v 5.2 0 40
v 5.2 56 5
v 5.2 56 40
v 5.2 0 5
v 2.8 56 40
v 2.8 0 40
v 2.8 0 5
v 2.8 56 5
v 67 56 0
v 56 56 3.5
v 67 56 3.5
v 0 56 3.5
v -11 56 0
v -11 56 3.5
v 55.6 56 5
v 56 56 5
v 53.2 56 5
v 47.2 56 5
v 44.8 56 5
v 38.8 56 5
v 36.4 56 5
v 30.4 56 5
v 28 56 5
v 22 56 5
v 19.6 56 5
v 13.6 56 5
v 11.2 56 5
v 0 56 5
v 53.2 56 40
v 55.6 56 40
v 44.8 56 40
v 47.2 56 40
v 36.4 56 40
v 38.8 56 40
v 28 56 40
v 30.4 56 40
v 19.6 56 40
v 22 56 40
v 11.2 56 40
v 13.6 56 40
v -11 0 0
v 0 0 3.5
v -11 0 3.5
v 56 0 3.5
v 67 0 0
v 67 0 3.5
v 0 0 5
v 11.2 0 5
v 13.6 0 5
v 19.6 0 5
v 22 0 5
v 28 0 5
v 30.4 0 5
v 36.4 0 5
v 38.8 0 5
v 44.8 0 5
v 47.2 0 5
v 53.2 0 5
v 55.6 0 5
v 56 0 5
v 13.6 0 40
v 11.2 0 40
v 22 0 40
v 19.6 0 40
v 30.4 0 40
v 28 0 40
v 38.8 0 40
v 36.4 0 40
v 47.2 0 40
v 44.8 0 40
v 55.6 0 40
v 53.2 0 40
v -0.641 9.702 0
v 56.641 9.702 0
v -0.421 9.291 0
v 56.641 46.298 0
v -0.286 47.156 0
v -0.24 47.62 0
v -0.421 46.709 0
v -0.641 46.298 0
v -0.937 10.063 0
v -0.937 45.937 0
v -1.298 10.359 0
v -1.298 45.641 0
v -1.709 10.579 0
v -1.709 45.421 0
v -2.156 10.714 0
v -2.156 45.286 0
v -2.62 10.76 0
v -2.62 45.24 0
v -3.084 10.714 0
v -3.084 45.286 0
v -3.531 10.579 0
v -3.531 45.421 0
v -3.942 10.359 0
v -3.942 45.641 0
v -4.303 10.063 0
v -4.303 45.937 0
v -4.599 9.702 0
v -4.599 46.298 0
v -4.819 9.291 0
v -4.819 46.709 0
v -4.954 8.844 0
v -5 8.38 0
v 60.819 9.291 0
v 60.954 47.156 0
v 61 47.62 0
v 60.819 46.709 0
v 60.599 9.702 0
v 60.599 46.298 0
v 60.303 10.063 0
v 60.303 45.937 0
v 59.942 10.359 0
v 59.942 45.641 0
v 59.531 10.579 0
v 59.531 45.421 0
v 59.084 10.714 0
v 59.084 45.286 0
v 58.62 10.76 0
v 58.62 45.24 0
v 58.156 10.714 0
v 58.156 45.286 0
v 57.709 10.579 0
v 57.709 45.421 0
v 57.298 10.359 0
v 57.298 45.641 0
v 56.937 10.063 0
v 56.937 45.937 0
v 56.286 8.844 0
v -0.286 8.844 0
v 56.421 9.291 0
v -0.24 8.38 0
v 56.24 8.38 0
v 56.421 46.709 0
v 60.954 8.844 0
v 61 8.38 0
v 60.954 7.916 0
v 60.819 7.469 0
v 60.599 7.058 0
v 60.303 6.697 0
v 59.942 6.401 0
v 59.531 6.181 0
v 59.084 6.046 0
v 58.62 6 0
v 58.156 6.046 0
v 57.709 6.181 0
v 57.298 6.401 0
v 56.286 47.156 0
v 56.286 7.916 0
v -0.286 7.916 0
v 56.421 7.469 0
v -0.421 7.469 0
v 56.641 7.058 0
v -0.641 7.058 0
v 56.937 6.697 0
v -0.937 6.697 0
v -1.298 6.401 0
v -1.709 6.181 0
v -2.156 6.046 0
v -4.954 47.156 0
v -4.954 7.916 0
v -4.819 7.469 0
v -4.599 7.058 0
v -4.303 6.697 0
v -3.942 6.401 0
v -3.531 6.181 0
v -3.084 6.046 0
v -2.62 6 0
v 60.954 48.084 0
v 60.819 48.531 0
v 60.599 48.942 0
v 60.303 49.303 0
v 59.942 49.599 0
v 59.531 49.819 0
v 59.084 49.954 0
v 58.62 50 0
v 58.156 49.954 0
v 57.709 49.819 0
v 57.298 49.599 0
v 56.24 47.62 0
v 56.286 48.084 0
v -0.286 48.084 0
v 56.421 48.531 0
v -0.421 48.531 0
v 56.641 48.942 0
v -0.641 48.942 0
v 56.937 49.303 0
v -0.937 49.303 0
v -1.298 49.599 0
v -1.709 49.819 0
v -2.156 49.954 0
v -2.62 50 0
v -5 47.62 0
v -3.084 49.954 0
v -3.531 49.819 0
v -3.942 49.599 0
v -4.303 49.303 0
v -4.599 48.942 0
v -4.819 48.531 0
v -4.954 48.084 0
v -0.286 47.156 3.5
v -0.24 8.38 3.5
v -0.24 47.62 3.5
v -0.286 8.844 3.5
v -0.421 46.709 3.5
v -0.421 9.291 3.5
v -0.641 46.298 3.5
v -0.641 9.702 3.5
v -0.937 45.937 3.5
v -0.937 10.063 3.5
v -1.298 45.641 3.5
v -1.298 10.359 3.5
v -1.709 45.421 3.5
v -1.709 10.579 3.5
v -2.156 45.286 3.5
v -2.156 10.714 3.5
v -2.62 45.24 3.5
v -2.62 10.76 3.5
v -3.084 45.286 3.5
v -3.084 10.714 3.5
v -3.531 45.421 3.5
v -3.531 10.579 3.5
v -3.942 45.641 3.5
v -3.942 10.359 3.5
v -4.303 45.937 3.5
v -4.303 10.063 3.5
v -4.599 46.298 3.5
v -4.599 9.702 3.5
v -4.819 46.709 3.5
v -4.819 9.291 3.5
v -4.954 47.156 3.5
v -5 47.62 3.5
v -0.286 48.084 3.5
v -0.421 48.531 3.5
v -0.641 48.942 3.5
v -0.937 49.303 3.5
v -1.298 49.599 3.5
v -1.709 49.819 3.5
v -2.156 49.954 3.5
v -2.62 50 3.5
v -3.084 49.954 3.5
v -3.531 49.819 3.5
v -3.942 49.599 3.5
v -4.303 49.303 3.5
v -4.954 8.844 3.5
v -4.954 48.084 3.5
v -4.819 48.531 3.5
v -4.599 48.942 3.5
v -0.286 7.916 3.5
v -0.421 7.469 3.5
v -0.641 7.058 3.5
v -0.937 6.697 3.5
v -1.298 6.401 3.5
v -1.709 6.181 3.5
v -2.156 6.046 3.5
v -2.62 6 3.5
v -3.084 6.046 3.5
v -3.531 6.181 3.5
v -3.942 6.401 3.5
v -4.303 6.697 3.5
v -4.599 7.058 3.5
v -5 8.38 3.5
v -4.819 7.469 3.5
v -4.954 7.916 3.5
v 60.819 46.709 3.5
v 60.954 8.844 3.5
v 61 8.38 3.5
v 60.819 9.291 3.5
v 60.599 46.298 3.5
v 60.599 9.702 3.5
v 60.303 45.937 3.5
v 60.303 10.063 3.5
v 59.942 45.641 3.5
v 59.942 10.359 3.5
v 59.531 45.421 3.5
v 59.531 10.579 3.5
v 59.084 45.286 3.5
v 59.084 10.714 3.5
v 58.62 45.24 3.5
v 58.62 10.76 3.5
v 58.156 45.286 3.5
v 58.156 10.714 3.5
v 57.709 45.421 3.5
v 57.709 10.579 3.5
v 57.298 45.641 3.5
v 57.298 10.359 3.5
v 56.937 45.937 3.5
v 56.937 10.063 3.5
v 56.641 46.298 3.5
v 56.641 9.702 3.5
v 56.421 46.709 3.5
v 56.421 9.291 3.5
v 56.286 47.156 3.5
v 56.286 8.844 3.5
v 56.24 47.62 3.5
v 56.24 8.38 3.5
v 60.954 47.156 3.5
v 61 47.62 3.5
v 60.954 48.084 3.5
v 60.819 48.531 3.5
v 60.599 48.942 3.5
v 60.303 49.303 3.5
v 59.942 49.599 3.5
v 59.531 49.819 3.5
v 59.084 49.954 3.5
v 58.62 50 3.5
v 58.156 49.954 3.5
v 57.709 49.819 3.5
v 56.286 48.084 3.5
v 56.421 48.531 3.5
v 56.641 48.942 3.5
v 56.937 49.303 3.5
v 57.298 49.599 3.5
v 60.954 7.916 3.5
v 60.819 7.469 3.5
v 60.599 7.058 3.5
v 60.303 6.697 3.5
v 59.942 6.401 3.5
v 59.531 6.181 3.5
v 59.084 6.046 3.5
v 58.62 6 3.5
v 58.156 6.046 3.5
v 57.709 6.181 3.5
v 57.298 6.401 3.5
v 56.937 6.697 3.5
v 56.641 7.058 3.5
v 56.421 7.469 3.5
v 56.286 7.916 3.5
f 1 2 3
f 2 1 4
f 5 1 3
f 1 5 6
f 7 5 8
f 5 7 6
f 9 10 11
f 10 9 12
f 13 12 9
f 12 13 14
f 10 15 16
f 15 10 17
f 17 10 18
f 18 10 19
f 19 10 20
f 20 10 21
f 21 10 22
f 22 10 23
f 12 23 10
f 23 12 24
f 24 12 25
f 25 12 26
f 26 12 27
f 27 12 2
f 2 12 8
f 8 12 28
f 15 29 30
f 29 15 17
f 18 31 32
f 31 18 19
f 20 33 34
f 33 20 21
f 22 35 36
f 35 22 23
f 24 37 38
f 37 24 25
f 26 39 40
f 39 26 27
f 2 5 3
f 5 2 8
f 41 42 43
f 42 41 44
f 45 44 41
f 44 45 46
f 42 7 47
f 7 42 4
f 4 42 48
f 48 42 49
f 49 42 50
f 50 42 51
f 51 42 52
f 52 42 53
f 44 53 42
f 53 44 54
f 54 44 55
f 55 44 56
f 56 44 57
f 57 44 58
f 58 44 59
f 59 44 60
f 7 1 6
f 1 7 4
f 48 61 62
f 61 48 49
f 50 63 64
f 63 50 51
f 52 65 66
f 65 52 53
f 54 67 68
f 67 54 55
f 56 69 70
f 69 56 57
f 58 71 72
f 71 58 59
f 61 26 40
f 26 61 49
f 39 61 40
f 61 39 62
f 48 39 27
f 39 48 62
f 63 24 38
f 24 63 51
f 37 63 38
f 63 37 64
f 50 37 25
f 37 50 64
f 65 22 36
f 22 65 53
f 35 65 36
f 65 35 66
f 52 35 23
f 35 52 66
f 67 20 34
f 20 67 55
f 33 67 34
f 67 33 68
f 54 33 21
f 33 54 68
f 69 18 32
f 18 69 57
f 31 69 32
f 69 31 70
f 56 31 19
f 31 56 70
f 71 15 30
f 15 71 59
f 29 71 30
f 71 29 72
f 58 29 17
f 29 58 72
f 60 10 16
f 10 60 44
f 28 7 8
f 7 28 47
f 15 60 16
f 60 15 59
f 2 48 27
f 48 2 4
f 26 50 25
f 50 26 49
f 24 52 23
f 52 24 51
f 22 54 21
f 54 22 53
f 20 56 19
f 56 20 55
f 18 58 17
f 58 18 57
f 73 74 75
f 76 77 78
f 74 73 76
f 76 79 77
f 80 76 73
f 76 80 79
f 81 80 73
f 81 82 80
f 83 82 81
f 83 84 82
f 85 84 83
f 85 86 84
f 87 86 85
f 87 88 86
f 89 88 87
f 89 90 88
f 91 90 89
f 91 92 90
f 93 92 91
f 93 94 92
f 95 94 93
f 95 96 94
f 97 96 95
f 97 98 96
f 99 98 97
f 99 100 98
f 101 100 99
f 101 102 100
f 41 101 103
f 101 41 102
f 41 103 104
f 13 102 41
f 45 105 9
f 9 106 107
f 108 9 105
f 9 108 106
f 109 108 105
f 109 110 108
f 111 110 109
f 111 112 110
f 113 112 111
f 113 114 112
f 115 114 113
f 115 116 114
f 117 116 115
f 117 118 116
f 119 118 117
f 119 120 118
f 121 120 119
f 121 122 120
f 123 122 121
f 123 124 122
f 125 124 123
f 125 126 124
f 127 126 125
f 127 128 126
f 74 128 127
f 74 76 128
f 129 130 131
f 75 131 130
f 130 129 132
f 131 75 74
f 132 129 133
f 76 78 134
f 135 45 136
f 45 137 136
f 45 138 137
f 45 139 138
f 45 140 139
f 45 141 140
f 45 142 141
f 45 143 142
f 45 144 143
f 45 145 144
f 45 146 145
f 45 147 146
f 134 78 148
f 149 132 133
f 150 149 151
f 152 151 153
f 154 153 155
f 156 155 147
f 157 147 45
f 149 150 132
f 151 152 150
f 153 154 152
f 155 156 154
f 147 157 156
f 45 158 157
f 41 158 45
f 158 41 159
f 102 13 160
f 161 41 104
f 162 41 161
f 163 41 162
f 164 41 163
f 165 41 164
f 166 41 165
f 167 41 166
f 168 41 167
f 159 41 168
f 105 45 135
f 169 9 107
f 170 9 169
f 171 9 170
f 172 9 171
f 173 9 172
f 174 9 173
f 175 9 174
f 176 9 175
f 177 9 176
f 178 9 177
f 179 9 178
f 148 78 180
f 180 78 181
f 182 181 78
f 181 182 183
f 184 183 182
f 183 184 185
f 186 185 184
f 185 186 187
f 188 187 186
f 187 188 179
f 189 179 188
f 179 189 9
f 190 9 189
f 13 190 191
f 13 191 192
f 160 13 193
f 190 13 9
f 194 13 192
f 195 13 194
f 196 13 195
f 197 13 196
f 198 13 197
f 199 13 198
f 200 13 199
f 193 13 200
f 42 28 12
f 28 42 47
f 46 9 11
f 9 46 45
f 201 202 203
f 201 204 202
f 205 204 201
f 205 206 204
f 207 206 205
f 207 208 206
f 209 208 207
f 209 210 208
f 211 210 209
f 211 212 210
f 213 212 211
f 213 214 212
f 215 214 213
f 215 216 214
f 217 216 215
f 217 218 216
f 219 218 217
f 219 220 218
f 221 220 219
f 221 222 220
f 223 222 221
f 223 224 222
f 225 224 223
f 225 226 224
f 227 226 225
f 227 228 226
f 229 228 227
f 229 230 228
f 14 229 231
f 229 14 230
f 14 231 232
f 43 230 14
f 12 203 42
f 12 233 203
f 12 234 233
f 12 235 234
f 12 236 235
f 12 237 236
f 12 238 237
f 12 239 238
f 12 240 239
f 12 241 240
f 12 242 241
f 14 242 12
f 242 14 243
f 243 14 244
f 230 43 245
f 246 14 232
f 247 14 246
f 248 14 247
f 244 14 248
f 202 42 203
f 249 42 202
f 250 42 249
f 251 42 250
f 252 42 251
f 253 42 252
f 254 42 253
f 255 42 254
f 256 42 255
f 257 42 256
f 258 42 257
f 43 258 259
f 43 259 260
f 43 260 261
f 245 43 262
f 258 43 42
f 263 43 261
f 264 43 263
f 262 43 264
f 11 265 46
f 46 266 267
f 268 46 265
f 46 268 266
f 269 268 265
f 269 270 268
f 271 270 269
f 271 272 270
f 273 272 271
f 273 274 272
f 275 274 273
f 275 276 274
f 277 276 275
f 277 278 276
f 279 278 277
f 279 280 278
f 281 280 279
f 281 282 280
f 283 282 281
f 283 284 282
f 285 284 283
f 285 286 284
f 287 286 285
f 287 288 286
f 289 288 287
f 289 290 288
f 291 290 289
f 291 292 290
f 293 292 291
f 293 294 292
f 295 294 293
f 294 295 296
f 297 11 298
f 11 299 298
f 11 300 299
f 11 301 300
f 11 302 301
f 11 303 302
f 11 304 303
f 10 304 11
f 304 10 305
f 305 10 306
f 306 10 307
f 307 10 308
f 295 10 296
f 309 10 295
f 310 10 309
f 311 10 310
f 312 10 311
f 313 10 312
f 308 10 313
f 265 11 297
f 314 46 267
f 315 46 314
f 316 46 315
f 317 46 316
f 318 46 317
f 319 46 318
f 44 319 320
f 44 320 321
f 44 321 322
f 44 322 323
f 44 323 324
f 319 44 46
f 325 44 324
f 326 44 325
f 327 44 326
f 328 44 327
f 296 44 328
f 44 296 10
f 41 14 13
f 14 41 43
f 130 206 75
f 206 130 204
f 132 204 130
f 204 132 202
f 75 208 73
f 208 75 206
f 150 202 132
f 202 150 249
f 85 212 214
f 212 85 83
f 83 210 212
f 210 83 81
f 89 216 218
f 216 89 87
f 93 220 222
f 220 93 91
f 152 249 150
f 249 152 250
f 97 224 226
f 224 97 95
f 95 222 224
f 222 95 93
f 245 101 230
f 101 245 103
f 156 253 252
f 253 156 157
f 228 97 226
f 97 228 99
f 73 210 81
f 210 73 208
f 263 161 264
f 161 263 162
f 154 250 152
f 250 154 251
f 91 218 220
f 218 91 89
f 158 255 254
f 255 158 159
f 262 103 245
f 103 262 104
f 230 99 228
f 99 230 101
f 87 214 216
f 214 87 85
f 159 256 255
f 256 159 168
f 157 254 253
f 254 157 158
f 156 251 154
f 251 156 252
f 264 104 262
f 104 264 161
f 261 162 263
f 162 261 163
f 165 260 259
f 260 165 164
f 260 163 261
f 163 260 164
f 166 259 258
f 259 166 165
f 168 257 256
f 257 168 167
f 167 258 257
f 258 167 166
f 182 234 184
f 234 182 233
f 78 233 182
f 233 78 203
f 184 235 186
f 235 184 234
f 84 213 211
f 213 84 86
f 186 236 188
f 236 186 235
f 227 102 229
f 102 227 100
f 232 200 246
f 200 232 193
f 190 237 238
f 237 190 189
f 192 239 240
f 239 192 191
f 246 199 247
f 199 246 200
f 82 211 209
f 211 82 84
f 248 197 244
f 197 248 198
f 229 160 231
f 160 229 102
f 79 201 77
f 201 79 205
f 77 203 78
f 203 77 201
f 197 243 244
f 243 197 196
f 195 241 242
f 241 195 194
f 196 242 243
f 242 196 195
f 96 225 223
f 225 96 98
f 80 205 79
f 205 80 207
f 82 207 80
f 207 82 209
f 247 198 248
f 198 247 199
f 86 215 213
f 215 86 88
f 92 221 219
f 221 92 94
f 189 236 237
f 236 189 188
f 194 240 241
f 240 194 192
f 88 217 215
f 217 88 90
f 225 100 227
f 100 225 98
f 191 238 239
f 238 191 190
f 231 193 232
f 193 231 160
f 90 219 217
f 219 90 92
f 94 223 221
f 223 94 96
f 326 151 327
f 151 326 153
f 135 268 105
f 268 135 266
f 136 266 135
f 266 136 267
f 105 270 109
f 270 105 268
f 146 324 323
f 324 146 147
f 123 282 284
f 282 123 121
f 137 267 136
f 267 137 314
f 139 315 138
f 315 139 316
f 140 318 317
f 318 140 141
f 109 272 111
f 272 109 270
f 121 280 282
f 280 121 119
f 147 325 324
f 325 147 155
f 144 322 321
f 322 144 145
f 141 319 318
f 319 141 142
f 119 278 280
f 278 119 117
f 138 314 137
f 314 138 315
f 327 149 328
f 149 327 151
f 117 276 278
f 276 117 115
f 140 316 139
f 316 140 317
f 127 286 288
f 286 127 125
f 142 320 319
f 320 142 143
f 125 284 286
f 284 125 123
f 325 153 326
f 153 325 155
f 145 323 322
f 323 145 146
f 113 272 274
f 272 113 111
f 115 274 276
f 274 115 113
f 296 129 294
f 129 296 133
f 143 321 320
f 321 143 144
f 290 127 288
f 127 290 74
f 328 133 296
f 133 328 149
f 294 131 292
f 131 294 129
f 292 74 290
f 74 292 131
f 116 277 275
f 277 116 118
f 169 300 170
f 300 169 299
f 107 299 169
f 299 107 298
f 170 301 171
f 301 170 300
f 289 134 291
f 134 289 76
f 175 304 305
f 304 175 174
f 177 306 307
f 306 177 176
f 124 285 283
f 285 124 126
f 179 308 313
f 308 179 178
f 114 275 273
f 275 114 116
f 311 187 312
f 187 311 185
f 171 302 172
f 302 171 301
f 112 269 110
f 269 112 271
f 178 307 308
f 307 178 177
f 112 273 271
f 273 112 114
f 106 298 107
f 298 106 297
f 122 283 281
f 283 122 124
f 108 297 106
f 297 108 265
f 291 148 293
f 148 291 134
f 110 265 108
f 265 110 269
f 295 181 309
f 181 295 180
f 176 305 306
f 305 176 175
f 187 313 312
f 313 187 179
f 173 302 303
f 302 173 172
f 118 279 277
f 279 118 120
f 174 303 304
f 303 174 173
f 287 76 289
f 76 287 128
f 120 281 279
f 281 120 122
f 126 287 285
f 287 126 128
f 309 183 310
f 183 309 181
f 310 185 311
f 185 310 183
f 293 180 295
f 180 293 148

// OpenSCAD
$fn = 32;

// ----------------------------------------------------------------------
// Finned heat sink: 56 x 56 mm base, 35 mm fins
// ----------------------------------------------------------------------

// --- parameters (mm) ---
base_w = 56;              // base width
base_d = 56;              // base depth
base_t = 5;               // base thickness
fin_h = 35;               // fin height above the base
holes_d = 4.76;           // fixing holes
hole_x = 30.62;           // hole offset in x
hole_y = 19.62;           // hole offset in y
fin_t = 2.4;              // fin thickness
fin_pitch = 8.4;          // fin pitch
fin_count = 7;            // number of fins
fin_x0 = 2.8;             // first fin offset
flange_w = 78;            // flange plate width
flange_t = 3;             // flange plate thickness

difference() {
  union() {
    cube([base_w, base_d, base_t]);
    for (i = [0 : fin_count - 1]) {
      translate([fin_x0 + i * fin_pitch, 0, base_t - 0.5]) cube([fin_t, base_d, fin_h + 0.5]);
    }
    /* mounting flange, a wider plate sharing the base bottom */
    translate([(base_w - flange_w) / 2, 0, 0]) cube([flange_w, base_d, flange_t + 0.5]);
  }
  /* fixing holes through the base, 2.5 mm clear on both sides */
  for (hx = [-30.62, 30.62]) {
    for (hy = [-19.62, 19.62]) {
      translate([base_w / 2 + hx, base_d / 2 + hy, -2.5]) cylinder(h = base_t + 5, d = holes_d);
    }
  }
}
